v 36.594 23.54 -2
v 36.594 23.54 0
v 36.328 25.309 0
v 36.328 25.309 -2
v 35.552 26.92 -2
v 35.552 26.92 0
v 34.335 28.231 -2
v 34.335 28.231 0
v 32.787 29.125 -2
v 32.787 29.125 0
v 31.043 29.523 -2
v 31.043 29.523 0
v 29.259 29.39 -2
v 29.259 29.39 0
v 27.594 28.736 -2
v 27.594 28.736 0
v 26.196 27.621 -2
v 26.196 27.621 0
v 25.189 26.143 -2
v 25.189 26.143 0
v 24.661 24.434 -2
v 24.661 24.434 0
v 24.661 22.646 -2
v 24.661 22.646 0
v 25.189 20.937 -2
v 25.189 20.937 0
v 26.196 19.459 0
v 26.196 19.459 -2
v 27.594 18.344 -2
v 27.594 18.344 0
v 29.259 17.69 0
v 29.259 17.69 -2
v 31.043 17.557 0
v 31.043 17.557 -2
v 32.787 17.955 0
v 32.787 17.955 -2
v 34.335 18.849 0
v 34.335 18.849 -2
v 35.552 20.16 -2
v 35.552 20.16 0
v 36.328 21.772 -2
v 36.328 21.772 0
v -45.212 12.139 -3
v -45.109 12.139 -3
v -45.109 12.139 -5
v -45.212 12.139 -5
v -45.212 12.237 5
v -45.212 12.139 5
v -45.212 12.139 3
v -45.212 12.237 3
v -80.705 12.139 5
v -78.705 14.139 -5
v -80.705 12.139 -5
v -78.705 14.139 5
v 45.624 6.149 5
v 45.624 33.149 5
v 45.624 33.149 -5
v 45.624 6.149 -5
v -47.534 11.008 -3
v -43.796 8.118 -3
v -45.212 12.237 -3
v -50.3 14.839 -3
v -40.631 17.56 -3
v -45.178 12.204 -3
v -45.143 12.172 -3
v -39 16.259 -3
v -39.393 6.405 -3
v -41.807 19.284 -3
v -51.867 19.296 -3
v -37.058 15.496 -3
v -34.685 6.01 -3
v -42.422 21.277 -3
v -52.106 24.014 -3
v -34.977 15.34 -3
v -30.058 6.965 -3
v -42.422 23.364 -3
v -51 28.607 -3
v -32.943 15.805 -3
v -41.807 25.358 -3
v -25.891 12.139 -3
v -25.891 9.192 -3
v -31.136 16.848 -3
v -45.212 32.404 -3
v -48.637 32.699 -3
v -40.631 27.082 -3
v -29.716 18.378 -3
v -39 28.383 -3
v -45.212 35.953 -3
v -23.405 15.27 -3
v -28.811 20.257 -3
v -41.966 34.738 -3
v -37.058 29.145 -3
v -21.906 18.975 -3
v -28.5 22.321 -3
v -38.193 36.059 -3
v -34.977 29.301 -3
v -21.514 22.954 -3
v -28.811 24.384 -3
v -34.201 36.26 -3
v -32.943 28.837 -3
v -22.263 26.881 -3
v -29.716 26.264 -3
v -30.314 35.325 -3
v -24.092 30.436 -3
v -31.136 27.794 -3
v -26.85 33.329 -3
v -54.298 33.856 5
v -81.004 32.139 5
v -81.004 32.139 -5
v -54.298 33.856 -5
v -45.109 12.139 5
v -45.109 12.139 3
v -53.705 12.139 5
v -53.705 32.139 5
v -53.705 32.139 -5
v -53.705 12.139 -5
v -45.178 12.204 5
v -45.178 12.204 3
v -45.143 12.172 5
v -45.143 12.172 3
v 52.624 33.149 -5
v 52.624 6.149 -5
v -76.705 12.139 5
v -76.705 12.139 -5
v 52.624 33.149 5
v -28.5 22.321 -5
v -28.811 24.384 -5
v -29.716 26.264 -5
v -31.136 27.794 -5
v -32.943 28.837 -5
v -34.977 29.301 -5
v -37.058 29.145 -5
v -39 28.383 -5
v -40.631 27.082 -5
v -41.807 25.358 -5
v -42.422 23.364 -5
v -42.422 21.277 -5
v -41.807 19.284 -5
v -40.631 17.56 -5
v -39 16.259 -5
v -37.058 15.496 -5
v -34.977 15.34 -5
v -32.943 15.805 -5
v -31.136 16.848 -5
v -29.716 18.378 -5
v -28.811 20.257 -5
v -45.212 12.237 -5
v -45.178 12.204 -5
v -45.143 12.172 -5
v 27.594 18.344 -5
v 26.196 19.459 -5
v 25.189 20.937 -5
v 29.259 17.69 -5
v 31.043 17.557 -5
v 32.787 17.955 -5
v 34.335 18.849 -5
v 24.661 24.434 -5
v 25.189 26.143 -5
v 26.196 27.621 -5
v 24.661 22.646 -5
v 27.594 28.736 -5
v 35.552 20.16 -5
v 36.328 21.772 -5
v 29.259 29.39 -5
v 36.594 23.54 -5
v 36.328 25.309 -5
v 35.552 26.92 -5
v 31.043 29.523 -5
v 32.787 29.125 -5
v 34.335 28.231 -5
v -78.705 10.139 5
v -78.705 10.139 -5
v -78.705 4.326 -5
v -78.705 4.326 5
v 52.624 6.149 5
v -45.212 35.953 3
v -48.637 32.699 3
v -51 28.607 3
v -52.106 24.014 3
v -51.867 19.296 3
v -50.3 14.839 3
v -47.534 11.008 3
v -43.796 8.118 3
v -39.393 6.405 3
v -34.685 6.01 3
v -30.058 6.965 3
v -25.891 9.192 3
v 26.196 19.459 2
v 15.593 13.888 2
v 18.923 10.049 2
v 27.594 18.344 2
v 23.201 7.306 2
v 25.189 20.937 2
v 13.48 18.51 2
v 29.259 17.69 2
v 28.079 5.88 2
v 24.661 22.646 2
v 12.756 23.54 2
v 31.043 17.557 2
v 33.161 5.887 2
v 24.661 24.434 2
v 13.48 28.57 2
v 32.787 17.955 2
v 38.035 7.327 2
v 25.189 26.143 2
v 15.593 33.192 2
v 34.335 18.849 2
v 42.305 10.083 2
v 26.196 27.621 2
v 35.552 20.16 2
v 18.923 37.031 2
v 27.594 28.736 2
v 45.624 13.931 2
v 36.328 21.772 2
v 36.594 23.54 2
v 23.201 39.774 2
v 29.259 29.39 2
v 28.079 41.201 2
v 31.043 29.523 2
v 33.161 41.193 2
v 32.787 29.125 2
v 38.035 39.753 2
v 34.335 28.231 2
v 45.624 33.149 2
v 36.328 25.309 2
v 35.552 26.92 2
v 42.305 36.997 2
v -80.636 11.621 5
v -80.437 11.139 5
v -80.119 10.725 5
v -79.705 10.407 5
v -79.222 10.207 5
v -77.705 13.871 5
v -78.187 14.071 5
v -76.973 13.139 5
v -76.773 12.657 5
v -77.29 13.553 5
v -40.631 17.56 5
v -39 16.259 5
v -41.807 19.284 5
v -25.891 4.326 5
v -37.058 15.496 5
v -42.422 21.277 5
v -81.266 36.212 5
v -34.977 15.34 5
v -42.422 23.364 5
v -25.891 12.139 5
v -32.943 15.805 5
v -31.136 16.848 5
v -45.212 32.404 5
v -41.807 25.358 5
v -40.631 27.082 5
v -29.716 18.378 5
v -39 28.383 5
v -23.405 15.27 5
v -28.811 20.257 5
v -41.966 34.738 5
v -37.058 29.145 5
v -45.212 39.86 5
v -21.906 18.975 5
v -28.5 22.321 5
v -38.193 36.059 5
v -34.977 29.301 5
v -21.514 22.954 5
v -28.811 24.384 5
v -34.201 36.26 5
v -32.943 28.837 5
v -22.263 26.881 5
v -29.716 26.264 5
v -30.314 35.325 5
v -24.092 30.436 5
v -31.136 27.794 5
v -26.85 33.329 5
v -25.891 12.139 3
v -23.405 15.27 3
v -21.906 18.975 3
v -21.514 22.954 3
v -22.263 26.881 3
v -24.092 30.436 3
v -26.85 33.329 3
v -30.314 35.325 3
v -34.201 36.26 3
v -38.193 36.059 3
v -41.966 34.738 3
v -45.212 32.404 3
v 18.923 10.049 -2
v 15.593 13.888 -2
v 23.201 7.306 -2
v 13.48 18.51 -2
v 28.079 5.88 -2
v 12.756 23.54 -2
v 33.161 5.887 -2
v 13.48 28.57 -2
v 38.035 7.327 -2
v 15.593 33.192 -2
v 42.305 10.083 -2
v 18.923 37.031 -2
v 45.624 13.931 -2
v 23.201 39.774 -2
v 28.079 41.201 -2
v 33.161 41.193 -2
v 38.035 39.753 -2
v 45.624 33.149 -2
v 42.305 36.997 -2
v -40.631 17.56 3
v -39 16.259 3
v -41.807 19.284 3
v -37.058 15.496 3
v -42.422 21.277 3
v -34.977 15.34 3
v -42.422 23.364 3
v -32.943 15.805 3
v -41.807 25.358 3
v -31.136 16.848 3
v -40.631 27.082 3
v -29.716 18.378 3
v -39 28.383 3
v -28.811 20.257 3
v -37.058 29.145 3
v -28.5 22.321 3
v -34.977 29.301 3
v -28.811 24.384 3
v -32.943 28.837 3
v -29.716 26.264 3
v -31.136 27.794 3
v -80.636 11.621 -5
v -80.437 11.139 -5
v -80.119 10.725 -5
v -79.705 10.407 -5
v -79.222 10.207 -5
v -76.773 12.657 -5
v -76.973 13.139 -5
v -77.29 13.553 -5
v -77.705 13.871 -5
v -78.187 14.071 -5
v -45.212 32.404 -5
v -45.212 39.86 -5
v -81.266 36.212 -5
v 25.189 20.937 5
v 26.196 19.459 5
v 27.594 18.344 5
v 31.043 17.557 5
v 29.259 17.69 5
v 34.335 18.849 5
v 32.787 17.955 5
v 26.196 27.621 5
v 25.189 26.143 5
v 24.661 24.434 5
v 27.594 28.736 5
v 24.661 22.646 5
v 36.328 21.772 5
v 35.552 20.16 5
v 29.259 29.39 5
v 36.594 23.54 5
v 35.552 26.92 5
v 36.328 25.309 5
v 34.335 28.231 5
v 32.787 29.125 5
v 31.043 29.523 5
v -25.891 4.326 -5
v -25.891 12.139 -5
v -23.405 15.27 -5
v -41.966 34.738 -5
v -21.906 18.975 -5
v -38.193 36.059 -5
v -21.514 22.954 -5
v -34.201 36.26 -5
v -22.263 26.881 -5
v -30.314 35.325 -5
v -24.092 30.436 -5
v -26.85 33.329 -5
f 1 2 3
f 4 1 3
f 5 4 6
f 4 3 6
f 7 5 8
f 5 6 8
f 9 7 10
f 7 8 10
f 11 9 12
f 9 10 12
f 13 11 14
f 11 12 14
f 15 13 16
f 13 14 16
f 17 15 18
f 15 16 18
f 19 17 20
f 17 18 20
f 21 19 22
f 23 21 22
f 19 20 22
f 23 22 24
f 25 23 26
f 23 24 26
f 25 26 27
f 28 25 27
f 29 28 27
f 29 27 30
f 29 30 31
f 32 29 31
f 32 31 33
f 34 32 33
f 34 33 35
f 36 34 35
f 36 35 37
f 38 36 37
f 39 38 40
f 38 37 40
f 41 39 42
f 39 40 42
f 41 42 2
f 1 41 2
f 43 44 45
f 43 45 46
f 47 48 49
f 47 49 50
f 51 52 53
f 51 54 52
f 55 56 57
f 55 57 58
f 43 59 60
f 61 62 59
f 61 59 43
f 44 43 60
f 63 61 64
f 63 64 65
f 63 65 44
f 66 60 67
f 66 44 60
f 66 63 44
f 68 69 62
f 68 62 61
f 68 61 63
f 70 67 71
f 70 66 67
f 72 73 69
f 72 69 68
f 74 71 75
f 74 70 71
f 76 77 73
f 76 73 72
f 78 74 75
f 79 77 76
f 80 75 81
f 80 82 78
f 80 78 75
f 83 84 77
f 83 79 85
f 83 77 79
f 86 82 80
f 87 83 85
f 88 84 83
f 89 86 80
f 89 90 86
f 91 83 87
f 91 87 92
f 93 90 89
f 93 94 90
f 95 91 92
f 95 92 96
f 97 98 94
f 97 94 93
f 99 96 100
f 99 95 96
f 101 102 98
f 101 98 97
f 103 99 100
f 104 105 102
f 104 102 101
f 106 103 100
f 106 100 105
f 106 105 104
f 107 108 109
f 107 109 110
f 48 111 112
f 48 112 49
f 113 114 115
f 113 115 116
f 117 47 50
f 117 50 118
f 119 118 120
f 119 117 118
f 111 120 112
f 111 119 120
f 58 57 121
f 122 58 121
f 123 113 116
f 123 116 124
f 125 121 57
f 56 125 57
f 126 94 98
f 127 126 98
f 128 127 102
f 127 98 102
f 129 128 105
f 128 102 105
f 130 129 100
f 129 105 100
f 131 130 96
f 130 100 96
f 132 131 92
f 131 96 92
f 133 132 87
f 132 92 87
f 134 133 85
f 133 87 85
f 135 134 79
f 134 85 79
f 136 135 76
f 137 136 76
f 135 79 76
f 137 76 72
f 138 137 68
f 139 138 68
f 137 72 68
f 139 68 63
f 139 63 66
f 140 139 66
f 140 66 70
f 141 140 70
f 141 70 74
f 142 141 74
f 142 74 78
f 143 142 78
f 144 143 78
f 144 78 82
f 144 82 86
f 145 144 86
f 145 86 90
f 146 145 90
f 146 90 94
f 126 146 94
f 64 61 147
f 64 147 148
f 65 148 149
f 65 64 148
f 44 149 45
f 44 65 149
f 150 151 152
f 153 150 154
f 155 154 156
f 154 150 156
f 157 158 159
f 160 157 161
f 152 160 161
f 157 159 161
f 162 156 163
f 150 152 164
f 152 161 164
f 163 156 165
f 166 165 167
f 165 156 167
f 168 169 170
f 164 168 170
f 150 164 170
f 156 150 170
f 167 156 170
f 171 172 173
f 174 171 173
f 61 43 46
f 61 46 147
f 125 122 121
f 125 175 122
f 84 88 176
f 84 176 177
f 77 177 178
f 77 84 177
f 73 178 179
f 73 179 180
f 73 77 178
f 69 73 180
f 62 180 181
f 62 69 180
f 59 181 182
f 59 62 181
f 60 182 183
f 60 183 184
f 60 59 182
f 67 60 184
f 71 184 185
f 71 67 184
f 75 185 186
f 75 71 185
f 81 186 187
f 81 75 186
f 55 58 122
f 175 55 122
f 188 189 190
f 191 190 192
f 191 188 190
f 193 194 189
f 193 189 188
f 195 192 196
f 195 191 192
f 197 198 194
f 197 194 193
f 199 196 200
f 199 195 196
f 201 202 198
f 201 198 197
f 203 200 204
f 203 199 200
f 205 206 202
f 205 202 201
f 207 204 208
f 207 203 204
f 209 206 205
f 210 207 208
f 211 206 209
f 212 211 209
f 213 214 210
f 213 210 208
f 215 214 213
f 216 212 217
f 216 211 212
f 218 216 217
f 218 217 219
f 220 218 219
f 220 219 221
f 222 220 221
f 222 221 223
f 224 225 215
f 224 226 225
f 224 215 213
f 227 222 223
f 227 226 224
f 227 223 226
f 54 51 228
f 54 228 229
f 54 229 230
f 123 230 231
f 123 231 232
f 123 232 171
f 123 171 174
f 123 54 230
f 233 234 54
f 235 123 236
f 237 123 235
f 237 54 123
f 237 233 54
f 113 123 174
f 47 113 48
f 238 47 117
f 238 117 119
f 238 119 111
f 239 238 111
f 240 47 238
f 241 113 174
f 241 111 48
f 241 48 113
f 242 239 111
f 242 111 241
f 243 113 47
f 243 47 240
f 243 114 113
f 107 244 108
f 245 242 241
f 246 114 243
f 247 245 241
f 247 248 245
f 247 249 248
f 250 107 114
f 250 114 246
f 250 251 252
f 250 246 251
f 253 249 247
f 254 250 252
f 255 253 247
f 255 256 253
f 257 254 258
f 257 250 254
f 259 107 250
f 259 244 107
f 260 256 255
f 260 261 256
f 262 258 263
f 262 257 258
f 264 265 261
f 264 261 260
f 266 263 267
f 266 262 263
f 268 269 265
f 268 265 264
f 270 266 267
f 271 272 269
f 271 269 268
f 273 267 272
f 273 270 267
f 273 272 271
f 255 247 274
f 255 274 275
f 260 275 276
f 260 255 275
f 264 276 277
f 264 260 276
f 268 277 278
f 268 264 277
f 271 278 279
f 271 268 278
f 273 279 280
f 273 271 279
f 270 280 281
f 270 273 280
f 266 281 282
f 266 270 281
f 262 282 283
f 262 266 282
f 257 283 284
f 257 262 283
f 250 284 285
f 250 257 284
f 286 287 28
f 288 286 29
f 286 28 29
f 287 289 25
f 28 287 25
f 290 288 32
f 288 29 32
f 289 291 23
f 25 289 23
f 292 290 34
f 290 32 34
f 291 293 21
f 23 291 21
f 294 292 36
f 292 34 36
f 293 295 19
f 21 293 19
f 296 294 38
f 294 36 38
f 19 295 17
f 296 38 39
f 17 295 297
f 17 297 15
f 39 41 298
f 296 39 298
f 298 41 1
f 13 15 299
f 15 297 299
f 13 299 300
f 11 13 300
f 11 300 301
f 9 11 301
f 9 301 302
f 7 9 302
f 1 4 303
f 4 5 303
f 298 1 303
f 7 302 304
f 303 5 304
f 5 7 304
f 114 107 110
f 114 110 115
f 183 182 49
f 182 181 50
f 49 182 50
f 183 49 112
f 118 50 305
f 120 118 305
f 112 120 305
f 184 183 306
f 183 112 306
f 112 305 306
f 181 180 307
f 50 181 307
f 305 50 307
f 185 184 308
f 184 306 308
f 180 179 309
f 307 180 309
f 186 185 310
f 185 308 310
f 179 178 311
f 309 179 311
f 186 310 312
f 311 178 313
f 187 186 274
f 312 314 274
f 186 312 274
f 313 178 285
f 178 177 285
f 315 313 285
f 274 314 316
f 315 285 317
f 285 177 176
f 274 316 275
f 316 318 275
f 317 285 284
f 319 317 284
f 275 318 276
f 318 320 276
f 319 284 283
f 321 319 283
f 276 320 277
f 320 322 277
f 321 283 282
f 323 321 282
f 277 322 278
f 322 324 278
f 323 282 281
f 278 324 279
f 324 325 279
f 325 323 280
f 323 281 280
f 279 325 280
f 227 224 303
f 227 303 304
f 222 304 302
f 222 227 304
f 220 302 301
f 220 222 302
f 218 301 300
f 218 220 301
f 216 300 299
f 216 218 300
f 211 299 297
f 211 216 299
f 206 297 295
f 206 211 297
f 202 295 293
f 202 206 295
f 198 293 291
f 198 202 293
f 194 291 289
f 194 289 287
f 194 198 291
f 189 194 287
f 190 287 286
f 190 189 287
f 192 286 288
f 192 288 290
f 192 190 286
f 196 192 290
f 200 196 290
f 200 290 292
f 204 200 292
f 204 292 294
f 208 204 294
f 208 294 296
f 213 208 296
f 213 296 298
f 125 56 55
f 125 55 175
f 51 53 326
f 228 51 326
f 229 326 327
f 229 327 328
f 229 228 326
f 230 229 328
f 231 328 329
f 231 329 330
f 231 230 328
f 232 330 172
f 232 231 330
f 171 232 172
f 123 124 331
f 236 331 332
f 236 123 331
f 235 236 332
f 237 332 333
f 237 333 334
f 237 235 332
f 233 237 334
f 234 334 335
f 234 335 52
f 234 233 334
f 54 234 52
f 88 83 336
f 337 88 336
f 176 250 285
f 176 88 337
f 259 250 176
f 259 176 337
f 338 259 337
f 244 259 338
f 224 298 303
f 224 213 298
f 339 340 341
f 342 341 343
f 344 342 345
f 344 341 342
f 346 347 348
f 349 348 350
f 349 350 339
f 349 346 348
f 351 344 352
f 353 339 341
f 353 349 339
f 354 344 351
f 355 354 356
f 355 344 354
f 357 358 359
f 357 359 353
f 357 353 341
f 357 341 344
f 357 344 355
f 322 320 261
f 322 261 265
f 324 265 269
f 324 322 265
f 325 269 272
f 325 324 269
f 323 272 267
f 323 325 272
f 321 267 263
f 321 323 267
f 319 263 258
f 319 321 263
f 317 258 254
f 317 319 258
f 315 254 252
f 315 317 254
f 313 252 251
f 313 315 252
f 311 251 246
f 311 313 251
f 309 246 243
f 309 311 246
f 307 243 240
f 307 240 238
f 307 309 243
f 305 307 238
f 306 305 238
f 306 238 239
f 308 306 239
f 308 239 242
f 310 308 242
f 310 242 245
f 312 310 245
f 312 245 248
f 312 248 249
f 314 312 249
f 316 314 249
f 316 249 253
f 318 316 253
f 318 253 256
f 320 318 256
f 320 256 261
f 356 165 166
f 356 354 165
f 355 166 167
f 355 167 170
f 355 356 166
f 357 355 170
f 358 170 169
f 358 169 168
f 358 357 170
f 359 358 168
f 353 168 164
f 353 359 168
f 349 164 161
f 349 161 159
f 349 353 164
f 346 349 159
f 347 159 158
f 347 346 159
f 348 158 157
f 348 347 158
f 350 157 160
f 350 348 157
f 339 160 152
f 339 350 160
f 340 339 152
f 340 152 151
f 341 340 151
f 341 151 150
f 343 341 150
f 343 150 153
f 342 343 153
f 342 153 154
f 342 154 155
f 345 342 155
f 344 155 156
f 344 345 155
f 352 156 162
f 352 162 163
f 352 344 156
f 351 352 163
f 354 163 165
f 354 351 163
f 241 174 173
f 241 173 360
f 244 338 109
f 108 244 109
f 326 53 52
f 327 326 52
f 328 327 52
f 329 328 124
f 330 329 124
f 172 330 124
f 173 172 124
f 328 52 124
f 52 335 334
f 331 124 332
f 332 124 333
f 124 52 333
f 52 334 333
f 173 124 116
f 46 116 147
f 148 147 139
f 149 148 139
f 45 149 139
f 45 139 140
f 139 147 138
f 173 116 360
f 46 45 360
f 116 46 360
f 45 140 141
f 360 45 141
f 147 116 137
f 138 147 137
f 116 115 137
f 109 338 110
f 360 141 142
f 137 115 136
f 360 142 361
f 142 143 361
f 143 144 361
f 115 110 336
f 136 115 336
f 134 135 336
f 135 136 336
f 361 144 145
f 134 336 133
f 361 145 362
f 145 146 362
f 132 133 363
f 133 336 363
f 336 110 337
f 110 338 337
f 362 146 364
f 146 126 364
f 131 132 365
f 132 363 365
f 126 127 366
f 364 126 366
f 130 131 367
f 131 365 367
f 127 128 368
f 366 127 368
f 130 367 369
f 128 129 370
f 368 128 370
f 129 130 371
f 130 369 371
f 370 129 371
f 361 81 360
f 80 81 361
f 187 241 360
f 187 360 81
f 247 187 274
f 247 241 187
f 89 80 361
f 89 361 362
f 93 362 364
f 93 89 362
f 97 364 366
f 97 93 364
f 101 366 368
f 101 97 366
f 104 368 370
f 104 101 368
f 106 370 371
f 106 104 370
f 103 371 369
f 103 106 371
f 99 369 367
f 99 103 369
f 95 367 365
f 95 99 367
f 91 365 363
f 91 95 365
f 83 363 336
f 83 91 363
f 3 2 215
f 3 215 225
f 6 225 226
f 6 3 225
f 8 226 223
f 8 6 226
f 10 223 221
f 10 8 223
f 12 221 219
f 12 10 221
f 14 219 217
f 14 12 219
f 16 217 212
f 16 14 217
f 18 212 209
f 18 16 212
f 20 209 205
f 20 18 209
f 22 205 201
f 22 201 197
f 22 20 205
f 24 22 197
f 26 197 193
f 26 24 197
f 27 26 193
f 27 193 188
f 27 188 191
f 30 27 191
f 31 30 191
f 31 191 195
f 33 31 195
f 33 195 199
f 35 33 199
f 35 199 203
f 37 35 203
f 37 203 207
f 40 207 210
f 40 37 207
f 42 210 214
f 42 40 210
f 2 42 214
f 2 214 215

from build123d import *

# Parameters (mm, degrees)
F1_DEPTH      = 5
F1_DEPTH_BACK = 5
F0_R          = 6
F2_DEPTH      = 2
F2_DEPTH_BACK = 2
F3_DEPTH      = 5
F3_DEPTH_BACK = 5
F0_R_2        = 7
F4_DEPTH      = 5
F4_DEPTH_BACK = 5
F6_R          = 16.5043071624
F7_DEPTH      = 3
F7_DEPTH_BACK = 3


with BuildPart() as f1:
    # F0 (on Top) → F1 (new body, two sides)
    with BuildSketch(Plane.XY) as f1_sk:
        Polygon((52.6240400672, 33.1490000429), (45.6240400672, 33.1490000429), (45.6240400672, 13.9311237542), (45.6240400672, 6.1490000429), (52.6240400672, 6.1490000429), align=None)
    extrude(amount=F1_DEPTH)
    extrude(f1_sk.sketch, amount=-F1_DEPTH_BACK)


with BuildPart() as f1b:
    # F0 (on Top) → F1, piece 2 (new body, two sides)
    with BuildSketch(Plane.XY) as f1_2_sk:
        with Locations((30.5944582386, 23.5400618985)):
            Circle(F0_R)
    extrude(amount=F1_DEPTH)
    extrude(f1_2_sk.sketch, amount=-F1_DEPTH_BACK)


with BuildPart() as f2:
    # F0 (on Top) → F2 (new body, two sides)
    with BuildSketch(Plane.XY) as f2_sk:
        with BuildLine():
            Line((45.6240400672, 13.9311237542), (45.6240400672, 33.1490000429))
            ThreePointArc((45.6240400672, 33.1490000429), (12.755735689, 23.5400618985), (45.6240400672, 13.9311237542))
        make_face()
        with Locations((30.5944582386, 23.5400618985)):
            Circle(F0_R, mode=Mode.SUBTRACT)
    extrude(amount=F2_DEPTH)
    extrude(f2_sk.sketch, amount=-F2_DEPTH_BACK)


with BuildPart() as f3:
    # F0 (on Top) → F3 (new body, two sides)
    with BuildSketch(Plane.XY) as f3_sk:
        with BuildLine():
            ThreePointArc((-80.7045657635, 12.1390005094), (-80.1187793258, 10.724786947), (-78.7045657635, 10.1390005094))
            Line((-78.7045657635, 10.1390005094), (-78.7045657635, 12.1390005094))
            Line((-78.7045657635, 12.1390005094), (-78.7045657635, 14.1390005094))
            Line((-78.7045657635, 14.1390005094), (-80.7045657635, 12.1390005094))
        make_face()
        with BuildLine():
            Line((-78.7045657635, 12.1390005094), (-76.7045657635, 12.1390005094))
            ThreePointArc((-76.7045657635, 12.1390005094), (-77.2903522011, 13.5532140718), (-78.7045657635, 14.1390005094))
            Line((-78.7045657635, 14.1390005094), (-78.7045657635, 12.1390005094))
        make_face()
        with BuildLine():
            ThreePointArc((-78.7045657635, 10.1390005094), (-77.2903522011, 10.724786947), (-76.7045657635, 12.1390005094))
            Line((-76.7045657635, 12.1390005094), (-78.7045657635, 12.1390005094))
            Line((-78.7045657635, 12.1390005094), (-78.7045657635, 10.1390005094))
        make_face()
        with BuildLine():
            Line((-78.7045657635, 4.3255217159), (-53.7045657635, 4.3255217159))
            Line((-53.7045657635, 4.3255217159), (-53.7045657635, 12.1390005094))
            Line((-53.7045657635, 12.1390005094), (-76.7045657635, 12.1390005094))
            ThreePointArc((-76.7045657635, 12.1390005094), (-77.2903522011, 10.724786947), (-78.7045657635, 10.1390005094))
            Line((-78.7045657635, 10.1390005094), (-78.7045657635, 4.3255217159))
        make_face()
        Polygon((-25.8910667433, 4.3255217159), (-25.8910667433, 12.1390005094), (-45.1089430319, 12.1390005094), (-45.2121123672, 12.1390005094), (-53.7045657635, 12.1390005094), (-53.7045657635, 4.3255217159), align=None)
        with BuildLine():
            ThreePointArc((-45.2121123672, 12.2373633661), (-49.5000048876, 22.320763998), (-45.2121123672, 32.40416463))
            Line((-45.2121123672, 32.40416463), (-53.7045657635, 32.1390005094))
            Line((-53.7045657635, 32.1390005094), (-53.7045657635, 12.1390005094))
            Line((-53.7045657635, 12.1390005094), (-45.2121123672, 12.1390005094))
            Line((-45.2121123672, 12.1390005094), (-45.2121123672, 12.2373633661))
        make_face()
        Polygon((-53.7045657635, 32.1390005094), (-45.2121123672, 32.40416463), (-45.2121123672, 39.8597121239), (-81.2664240588, 36.2122802645), (-81.0044705868, 32.1390005094), (-54.2979996242, 33.8564992364), align=None)
    extrude(amount=F3_DEPTH)
    extrude(f3_sk.sketch, amount=-F3_DEPTH_BACK)

    # F0 (on Top) → F4 (join, two sides)
    with BuildSketch(Plane.XY) as f4_sk:
        with BuildLine():
            Line((-45.2121123672, 12.2373633661), (-45.2121123672, 32.40416463))
            ThreePointArc((-45.2121123672, 32.40416463), (-49.5000048876, 22.320763998), (-45.2121123672, 12.2373633661))
        make_face()
        with BuildLine():
            Line((-45.1089430319, 12.1390005094), (-25.8910667433, 12.1390005094))
            ThreePointArc((-25.8910667433, 12.1390005094), (-25.3672915201, 31.9814119998), (-45.2121123672, 32.40416463))
            Line((-45.2121123672, 32.40416463), (-45.2121123672, 12.2373633661))
            ThreePointArc((-45.2121123672, 12.2373633661), (-45.1606528893, 12.1880506306), (-45.1089430319, 12.1390005094))
        make_face()
        with Locations((-35.5000048876, 22.320763998)):
            Circle(F0_R_2, mode=Mode.SUBTRACT)
    extrude(amount=F4_DEPTH)
    extrude(f4_sk.sketch, amount=-F4_DEPTH_BACK)

    # F6 (on Top) → F7 (cut, two sides)
    with BuildSketch(Plane.XY) as f7_sk:
        with Locations((-35.6732159853, 22.4846862257)):
            Circle(F6_R)
    extrude(amount=-F7_DEPTH, mode=Mode.SUBTRACT)
    extrude(f7_sk.sketch, amount=F7_DEPTH_BACK, mode=Mode.SUBTRACT)


solid = Compound([f1.part, f1b.part, f2.part, f3.part])
